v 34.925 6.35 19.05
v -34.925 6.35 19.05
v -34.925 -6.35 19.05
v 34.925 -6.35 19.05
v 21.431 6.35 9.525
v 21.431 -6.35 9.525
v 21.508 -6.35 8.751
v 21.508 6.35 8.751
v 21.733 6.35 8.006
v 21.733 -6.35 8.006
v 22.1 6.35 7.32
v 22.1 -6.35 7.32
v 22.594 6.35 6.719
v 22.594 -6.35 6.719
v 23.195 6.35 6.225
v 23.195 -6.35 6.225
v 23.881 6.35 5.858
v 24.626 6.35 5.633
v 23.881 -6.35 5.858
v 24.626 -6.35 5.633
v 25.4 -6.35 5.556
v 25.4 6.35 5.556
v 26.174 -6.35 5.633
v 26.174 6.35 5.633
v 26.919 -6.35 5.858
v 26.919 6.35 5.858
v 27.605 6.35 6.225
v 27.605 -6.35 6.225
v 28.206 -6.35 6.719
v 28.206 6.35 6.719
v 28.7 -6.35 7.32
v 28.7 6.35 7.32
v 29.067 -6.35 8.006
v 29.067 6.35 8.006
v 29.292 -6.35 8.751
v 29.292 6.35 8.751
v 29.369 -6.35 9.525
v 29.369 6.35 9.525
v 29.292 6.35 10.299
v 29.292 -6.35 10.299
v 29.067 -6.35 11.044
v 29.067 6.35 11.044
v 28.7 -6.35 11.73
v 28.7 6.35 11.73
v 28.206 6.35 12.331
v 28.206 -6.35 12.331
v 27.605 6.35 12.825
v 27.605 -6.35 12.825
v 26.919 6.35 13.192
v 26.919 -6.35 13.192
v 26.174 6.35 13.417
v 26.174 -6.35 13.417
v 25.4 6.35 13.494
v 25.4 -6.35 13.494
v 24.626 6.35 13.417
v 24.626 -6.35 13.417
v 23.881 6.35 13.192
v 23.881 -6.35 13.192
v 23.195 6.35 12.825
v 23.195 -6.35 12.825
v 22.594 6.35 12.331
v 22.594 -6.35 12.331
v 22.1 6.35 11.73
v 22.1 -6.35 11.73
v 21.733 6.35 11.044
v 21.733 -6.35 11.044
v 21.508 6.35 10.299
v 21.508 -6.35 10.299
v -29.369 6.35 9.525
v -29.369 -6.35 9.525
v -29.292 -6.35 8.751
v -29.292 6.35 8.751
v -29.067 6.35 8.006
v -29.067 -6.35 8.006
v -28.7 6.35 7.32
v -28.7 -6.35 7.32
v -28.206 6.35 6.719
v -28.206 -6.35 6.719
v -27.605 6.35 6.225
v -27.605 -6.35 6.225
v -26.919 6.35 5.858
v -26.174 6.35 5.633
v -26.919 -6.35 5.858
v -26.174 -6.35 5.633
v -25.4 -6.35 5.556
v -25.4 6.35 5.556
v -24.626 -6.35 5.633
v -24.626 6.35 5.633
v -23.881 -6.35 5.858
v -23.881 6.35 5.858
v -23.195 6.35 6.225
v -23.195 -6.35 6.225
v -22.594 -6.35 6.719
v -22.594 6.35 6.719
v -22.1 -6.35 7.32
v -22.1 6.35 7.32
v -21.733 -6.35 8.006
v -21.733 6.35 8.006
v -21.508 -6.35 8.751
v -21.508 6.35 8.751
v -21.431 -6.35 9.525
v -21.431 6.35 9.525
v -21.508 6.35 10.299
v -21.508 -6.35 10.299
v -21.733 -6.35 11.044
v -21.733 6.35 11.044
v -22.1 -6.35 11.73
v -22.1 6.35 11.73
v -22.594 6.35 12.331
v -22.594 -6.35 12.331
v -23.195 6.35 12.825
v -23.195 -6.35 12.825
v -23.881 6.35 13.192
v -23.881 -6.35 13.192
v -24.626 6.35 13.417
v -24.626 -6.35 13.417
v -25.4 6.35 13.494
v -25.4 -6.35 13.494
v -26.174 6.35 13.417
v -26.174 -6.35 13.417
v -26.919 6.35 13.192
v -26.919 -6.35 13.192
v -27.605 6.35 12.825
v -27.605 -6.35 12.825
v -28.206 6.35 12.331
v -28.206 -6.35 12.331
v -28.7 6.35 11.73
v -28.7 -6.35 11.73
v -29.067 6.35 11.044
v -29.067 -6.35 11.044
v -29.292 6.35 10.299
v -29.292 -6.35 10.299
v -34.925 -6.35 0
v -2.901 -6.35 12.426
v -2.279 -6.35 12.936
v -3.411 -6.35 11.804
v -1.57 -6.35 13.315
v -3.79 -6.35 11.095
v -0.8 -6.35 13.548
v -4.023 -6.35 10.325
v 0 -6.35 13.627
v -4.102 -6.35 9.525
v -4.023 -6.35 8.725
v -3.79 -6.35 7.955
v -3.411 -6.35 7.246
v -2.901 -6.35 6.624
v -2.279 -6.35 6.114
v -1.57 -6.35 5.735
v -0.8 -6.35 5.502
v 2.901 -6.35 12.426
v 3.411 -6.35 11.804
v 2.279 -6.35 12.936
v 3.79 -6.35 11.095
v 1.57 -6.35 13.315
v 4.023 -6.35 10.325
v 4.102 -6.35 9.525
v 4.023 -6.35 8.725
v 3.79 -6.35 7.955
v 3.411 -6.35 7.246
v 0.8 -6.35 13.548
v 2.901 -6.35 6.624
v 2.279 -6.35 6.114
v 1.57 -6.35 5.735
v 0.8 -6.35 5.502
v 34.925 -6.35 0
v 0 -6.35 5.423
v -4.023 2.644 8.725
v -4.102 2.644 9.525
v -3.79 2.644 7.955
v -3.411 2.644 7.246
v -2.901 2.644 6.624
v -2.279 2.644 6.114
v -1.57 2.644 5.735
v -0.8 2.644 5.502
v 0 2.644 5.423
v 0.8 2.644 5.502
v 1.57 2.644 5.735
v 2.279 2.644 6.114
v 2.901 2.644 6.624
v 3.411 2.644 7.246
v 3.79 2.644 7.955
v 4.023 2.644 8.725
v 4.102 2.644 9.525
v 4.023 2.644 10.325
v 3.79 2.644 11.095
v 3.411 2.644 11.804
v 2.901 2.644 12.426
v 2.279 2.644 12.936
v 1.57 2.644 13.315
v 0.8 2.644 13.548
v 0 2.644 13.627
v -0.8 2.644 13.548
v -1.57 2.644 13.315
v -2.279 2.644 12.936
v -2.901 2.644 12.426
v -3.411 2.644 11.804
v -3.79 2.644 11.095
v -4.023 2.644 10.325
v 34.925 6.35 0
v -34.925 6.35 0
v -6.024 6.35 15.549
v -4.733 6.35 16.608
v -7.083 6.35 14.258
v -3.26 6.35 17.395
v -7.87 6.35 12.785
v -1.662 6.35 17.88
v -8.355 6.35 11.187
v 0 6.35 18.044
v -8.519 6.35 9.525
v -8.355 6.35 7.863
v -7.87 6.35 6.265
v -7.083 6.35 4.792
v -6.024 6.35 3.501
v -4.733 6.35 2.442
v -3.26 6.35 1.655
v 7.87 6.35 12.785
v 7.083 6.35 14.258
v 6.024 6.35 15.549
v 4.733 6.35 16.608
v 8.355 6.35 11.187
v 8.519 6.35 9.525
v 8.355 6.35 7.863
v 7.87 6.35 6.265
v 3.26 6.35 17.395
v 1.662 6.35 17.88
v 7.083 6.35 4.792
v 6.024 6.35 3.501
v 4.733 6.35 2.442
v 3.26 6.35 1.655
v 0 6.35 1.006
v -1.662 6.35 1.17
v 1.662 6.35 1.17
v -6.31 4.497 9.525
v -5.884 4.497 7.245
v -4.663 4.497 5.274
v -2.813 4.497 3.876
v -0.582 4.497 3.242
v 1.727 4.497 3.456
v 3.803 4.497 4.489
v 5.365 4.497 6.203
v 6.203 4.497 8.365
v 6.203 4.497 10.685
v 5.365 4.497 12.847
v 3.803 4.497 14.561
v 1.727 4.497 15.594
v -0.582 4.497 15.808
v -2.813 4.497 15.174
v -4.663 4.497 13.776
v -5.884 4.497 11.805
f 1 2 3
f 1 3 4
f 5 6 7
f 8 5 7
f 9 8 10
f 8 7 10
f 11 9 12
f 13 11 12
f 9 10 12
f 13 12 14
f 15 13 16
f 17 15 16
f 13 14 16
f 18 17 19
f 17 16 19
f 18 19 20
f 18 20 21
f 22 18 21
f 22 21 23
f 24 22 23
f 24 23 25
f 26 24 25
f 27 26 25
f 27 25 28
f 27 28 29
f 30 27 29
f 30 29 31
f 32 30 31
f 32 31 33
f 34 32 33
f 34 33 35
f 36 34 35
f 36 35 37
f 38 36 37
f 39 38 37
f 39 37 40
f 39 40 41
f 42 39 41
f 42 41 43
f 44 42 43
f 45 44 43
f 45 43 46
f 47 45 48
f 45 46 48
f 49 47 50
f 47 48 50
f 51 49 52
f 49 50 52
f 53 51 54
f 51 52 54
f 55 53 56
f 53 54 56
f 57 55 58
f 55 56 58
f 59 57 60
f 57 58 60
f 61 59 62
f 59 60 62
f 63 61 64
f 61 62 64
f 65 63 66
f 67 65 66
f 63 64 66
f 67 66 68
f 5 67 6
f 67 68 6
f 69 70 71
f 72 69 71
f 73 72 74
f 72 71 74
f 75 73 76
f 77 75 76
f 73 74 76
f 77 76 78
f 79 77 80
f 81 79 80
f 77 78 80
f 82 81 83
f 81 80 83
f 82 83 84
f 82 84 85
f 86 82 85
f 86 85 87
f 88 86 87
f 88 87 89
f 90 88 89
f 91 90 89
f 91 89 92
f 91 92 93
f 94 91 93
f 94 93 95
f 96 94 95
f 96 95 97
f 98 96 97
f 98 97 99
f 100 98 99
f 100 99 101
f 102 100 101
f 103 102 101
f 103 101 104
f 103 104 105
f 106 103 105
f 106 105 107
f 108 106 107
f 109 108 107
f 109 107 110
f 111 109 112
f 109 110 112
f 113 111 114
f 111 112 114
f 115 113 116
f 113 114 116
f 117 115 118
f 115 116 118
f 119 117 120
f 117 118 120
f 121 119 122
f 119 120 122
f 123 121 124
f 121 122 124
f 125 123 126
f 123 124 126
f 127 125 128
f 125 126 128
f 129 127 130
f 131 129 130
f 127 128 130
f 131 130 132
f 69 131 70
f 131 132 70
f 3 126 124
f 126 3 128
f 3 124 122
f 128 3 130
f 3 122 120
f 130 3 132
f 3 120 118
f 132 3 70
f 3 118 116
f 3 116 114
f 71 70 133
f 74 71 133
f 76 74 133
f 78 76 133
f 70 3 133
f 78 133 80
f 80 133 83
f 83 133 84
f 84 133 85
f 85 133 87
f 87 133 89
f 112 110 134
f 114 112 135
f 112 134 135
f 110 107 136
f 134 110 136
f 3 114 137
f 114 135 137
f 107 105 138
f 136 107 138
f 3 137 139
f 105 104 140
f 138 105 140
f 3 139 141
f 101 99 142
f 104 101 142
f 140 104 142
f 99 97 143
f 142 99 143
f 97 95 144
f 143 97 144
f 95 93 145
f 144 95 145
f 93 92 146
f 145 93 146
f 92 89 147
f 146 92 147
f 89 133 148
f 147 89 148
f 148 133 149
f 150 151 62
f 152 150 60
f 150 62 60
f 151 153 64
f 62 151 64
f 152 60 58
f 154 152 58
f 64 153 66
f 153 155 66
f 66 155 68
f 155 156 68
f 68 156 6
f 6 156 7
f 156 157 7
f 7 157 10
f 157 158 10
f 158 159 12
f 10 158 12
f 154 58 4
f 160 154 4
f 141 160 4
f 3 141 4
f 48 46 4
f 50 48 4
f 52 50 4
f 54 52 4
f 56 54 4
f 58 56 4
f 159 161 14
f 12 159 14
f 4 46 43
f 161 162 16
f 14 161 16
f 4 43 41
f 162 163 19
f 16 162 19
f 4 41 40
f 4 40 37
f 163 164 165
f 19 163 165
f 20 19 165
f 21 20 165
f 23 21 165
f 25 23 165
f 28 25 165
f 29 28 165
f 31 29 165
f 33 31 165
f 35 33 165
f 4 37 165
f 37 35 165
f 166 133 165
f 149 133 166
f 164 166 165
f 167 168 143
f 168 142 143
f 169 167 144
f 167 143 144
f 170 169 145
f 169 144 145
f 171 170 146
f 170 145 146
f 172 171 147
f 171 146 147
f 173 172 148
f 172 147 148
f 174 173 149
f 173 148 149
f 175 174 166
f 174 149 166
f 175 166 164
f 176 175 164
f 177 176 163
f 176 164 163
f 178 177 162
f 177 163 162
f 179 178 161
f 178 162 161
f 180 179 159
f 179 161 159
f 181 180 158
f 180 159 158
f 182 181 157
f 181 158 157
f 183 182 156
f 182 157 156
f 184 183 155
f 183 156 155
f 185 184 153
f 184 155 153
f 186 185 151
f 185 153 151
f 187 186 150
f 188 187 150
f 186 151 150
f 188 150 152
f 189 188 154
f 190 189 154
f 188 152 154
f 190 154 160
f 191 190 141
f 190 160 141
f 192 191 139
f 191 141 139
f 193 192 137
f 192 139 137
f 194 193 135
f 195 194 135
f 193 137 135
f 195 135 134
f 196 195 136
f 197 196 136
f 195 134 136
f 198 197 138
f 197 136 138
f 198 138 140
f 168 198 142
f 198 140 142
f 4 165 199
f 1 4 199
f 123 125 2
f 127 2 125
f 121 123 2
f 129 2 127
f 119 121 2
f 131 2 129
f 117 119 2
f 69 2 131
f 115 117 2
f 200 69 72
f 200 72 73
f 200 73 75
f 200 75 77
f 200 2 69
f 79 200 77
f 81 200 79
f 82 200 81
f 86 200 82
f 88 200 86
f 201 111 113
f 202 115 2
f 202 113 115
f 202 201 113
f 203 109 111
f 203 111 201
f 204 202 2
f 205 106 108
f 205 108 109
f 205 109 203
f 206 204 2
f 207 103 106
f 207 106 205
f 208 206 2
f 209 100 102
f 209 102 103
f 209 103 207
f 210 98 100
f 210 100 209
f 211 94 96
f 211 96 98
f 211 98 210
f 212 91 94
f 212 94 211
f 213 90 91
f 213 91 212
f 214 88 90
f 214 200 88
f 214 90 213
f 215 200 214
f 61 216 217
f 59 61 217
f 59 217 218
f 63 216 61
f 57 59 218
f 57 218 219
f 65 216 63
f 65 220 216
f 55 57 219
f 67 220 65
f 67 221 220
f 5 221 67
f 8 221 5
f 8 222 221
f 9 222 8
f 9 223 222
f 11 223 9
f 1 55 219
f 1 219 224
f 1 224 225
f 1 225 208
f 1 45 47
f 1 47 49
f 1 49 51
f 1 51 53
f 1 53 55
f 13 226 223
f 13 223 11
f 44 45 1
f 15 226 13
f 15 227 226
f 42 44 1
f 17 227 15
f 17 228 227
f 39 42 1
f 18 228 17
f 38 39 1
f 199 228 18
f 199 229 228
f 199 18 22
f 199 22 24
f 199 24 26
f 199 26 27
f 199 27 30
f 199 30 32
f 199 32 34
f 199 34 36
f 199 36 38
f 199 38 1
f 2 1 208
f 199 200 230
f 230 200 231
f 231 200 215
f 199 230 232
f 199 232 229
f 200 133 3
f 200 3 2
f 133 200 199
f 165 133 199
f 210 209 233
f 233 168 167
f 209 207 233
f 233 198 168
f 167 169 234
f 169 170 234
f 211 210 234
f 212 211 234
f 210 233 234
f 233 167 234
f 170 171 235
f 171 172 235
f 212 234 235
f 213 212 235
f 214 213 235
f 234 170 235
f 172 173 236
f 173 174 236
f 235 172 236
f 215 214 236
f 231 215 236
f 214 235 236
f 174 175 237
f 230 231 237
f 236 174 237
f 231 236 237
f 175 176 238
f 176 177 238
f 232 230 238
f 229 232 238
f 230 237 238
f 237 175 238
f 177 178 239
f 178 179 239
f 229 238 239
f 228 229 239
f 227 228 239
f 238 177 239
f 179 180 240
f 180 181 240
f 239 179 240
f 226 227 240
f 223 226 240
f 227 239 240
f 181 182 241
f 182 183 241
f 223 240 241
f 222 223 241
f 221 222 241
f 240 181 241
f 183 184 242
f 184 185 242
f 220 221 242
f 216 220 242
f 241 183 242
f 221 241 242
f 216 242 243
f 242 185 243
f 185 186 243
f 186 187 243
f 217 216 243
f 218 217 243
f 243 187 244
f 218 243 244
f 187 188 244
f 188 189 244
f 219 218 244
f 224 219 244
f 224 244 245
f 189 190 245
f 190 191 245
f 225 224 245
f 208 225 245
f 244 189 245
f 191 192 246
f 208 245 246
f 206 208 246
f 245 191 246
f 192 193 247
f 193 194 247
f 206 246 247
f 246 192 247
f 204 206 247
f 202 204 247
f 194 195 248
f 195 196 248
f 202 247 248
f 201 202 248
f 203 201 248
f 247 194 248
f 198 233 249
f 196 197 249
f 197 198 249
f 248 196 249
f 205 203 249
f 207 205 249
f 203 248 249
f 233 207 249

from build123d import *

# Parameters (mm, degrees)
SKETCH1_W                                           = 69.85
SKETCH1_H                                           = 12.7
BOSS_EXTRUDE1_DEPTH                                 = 19.05
F_5_16_0_3125_DIAMETER_HOLE1_D                      = 7.9375
CSK_FOR_5_16_FLAT_HEAD_MACHINE_SCREW_10_D           = 8.2042
CSK_FOR_5_16_FLAT_HEAD_MACHINE_SCREW_10_CSINK_D     = 17.0371262
CSK_FOR_5_16_FLAT_HEAD_MACHINE_SCREW_10_CSINK_ANGLE = 100


with BuildPart() as part:
    # Sketch1 → Boss-Extrude1 (new body)
    with BuildSketch(Plane.XY):
        Rectangle(SKETCH1_W, SKETCH1_H)
    extrude(amount=BOSS_EXTRUDE1_DEPTH)

    # 5/16 (0.3125) Diameter Hole1 (through all)
    with Locations(Plane(origin=(0, 6.35, 0), x_dir=(1, 0, 0), z_dir=(0, 1, 0))):
        with Locations((-25.4, -9.525), (25.4, -9.525)):
            Hole(F_5_16_0_3125_DIAMETER_HOLE1_D / 2)

    # CSK for 5/16 Flat Head Machine Screw (100)1 (through all)
    with Locations(Plane(origin=(0, 6.35, 0), x_dir=(1, 0, 0), z_dir=(0, 1, 0))):
        with Locations((0, -9.525)):
            CounterSinkHole(CSK_FOR_5_16_FLAT_HEAD_MACHINE_SCREW_10_D / 2, CSK_FOR_5_16_FLAT_HEAD_MACHINE_SCREW_10_CSINK_D / 2, counter_sink_angle=CSK_FOR_5_16_FLAT_HEAD_MACHINE_SCREW_10_CSINK_ANGLE)


solid = part.part
